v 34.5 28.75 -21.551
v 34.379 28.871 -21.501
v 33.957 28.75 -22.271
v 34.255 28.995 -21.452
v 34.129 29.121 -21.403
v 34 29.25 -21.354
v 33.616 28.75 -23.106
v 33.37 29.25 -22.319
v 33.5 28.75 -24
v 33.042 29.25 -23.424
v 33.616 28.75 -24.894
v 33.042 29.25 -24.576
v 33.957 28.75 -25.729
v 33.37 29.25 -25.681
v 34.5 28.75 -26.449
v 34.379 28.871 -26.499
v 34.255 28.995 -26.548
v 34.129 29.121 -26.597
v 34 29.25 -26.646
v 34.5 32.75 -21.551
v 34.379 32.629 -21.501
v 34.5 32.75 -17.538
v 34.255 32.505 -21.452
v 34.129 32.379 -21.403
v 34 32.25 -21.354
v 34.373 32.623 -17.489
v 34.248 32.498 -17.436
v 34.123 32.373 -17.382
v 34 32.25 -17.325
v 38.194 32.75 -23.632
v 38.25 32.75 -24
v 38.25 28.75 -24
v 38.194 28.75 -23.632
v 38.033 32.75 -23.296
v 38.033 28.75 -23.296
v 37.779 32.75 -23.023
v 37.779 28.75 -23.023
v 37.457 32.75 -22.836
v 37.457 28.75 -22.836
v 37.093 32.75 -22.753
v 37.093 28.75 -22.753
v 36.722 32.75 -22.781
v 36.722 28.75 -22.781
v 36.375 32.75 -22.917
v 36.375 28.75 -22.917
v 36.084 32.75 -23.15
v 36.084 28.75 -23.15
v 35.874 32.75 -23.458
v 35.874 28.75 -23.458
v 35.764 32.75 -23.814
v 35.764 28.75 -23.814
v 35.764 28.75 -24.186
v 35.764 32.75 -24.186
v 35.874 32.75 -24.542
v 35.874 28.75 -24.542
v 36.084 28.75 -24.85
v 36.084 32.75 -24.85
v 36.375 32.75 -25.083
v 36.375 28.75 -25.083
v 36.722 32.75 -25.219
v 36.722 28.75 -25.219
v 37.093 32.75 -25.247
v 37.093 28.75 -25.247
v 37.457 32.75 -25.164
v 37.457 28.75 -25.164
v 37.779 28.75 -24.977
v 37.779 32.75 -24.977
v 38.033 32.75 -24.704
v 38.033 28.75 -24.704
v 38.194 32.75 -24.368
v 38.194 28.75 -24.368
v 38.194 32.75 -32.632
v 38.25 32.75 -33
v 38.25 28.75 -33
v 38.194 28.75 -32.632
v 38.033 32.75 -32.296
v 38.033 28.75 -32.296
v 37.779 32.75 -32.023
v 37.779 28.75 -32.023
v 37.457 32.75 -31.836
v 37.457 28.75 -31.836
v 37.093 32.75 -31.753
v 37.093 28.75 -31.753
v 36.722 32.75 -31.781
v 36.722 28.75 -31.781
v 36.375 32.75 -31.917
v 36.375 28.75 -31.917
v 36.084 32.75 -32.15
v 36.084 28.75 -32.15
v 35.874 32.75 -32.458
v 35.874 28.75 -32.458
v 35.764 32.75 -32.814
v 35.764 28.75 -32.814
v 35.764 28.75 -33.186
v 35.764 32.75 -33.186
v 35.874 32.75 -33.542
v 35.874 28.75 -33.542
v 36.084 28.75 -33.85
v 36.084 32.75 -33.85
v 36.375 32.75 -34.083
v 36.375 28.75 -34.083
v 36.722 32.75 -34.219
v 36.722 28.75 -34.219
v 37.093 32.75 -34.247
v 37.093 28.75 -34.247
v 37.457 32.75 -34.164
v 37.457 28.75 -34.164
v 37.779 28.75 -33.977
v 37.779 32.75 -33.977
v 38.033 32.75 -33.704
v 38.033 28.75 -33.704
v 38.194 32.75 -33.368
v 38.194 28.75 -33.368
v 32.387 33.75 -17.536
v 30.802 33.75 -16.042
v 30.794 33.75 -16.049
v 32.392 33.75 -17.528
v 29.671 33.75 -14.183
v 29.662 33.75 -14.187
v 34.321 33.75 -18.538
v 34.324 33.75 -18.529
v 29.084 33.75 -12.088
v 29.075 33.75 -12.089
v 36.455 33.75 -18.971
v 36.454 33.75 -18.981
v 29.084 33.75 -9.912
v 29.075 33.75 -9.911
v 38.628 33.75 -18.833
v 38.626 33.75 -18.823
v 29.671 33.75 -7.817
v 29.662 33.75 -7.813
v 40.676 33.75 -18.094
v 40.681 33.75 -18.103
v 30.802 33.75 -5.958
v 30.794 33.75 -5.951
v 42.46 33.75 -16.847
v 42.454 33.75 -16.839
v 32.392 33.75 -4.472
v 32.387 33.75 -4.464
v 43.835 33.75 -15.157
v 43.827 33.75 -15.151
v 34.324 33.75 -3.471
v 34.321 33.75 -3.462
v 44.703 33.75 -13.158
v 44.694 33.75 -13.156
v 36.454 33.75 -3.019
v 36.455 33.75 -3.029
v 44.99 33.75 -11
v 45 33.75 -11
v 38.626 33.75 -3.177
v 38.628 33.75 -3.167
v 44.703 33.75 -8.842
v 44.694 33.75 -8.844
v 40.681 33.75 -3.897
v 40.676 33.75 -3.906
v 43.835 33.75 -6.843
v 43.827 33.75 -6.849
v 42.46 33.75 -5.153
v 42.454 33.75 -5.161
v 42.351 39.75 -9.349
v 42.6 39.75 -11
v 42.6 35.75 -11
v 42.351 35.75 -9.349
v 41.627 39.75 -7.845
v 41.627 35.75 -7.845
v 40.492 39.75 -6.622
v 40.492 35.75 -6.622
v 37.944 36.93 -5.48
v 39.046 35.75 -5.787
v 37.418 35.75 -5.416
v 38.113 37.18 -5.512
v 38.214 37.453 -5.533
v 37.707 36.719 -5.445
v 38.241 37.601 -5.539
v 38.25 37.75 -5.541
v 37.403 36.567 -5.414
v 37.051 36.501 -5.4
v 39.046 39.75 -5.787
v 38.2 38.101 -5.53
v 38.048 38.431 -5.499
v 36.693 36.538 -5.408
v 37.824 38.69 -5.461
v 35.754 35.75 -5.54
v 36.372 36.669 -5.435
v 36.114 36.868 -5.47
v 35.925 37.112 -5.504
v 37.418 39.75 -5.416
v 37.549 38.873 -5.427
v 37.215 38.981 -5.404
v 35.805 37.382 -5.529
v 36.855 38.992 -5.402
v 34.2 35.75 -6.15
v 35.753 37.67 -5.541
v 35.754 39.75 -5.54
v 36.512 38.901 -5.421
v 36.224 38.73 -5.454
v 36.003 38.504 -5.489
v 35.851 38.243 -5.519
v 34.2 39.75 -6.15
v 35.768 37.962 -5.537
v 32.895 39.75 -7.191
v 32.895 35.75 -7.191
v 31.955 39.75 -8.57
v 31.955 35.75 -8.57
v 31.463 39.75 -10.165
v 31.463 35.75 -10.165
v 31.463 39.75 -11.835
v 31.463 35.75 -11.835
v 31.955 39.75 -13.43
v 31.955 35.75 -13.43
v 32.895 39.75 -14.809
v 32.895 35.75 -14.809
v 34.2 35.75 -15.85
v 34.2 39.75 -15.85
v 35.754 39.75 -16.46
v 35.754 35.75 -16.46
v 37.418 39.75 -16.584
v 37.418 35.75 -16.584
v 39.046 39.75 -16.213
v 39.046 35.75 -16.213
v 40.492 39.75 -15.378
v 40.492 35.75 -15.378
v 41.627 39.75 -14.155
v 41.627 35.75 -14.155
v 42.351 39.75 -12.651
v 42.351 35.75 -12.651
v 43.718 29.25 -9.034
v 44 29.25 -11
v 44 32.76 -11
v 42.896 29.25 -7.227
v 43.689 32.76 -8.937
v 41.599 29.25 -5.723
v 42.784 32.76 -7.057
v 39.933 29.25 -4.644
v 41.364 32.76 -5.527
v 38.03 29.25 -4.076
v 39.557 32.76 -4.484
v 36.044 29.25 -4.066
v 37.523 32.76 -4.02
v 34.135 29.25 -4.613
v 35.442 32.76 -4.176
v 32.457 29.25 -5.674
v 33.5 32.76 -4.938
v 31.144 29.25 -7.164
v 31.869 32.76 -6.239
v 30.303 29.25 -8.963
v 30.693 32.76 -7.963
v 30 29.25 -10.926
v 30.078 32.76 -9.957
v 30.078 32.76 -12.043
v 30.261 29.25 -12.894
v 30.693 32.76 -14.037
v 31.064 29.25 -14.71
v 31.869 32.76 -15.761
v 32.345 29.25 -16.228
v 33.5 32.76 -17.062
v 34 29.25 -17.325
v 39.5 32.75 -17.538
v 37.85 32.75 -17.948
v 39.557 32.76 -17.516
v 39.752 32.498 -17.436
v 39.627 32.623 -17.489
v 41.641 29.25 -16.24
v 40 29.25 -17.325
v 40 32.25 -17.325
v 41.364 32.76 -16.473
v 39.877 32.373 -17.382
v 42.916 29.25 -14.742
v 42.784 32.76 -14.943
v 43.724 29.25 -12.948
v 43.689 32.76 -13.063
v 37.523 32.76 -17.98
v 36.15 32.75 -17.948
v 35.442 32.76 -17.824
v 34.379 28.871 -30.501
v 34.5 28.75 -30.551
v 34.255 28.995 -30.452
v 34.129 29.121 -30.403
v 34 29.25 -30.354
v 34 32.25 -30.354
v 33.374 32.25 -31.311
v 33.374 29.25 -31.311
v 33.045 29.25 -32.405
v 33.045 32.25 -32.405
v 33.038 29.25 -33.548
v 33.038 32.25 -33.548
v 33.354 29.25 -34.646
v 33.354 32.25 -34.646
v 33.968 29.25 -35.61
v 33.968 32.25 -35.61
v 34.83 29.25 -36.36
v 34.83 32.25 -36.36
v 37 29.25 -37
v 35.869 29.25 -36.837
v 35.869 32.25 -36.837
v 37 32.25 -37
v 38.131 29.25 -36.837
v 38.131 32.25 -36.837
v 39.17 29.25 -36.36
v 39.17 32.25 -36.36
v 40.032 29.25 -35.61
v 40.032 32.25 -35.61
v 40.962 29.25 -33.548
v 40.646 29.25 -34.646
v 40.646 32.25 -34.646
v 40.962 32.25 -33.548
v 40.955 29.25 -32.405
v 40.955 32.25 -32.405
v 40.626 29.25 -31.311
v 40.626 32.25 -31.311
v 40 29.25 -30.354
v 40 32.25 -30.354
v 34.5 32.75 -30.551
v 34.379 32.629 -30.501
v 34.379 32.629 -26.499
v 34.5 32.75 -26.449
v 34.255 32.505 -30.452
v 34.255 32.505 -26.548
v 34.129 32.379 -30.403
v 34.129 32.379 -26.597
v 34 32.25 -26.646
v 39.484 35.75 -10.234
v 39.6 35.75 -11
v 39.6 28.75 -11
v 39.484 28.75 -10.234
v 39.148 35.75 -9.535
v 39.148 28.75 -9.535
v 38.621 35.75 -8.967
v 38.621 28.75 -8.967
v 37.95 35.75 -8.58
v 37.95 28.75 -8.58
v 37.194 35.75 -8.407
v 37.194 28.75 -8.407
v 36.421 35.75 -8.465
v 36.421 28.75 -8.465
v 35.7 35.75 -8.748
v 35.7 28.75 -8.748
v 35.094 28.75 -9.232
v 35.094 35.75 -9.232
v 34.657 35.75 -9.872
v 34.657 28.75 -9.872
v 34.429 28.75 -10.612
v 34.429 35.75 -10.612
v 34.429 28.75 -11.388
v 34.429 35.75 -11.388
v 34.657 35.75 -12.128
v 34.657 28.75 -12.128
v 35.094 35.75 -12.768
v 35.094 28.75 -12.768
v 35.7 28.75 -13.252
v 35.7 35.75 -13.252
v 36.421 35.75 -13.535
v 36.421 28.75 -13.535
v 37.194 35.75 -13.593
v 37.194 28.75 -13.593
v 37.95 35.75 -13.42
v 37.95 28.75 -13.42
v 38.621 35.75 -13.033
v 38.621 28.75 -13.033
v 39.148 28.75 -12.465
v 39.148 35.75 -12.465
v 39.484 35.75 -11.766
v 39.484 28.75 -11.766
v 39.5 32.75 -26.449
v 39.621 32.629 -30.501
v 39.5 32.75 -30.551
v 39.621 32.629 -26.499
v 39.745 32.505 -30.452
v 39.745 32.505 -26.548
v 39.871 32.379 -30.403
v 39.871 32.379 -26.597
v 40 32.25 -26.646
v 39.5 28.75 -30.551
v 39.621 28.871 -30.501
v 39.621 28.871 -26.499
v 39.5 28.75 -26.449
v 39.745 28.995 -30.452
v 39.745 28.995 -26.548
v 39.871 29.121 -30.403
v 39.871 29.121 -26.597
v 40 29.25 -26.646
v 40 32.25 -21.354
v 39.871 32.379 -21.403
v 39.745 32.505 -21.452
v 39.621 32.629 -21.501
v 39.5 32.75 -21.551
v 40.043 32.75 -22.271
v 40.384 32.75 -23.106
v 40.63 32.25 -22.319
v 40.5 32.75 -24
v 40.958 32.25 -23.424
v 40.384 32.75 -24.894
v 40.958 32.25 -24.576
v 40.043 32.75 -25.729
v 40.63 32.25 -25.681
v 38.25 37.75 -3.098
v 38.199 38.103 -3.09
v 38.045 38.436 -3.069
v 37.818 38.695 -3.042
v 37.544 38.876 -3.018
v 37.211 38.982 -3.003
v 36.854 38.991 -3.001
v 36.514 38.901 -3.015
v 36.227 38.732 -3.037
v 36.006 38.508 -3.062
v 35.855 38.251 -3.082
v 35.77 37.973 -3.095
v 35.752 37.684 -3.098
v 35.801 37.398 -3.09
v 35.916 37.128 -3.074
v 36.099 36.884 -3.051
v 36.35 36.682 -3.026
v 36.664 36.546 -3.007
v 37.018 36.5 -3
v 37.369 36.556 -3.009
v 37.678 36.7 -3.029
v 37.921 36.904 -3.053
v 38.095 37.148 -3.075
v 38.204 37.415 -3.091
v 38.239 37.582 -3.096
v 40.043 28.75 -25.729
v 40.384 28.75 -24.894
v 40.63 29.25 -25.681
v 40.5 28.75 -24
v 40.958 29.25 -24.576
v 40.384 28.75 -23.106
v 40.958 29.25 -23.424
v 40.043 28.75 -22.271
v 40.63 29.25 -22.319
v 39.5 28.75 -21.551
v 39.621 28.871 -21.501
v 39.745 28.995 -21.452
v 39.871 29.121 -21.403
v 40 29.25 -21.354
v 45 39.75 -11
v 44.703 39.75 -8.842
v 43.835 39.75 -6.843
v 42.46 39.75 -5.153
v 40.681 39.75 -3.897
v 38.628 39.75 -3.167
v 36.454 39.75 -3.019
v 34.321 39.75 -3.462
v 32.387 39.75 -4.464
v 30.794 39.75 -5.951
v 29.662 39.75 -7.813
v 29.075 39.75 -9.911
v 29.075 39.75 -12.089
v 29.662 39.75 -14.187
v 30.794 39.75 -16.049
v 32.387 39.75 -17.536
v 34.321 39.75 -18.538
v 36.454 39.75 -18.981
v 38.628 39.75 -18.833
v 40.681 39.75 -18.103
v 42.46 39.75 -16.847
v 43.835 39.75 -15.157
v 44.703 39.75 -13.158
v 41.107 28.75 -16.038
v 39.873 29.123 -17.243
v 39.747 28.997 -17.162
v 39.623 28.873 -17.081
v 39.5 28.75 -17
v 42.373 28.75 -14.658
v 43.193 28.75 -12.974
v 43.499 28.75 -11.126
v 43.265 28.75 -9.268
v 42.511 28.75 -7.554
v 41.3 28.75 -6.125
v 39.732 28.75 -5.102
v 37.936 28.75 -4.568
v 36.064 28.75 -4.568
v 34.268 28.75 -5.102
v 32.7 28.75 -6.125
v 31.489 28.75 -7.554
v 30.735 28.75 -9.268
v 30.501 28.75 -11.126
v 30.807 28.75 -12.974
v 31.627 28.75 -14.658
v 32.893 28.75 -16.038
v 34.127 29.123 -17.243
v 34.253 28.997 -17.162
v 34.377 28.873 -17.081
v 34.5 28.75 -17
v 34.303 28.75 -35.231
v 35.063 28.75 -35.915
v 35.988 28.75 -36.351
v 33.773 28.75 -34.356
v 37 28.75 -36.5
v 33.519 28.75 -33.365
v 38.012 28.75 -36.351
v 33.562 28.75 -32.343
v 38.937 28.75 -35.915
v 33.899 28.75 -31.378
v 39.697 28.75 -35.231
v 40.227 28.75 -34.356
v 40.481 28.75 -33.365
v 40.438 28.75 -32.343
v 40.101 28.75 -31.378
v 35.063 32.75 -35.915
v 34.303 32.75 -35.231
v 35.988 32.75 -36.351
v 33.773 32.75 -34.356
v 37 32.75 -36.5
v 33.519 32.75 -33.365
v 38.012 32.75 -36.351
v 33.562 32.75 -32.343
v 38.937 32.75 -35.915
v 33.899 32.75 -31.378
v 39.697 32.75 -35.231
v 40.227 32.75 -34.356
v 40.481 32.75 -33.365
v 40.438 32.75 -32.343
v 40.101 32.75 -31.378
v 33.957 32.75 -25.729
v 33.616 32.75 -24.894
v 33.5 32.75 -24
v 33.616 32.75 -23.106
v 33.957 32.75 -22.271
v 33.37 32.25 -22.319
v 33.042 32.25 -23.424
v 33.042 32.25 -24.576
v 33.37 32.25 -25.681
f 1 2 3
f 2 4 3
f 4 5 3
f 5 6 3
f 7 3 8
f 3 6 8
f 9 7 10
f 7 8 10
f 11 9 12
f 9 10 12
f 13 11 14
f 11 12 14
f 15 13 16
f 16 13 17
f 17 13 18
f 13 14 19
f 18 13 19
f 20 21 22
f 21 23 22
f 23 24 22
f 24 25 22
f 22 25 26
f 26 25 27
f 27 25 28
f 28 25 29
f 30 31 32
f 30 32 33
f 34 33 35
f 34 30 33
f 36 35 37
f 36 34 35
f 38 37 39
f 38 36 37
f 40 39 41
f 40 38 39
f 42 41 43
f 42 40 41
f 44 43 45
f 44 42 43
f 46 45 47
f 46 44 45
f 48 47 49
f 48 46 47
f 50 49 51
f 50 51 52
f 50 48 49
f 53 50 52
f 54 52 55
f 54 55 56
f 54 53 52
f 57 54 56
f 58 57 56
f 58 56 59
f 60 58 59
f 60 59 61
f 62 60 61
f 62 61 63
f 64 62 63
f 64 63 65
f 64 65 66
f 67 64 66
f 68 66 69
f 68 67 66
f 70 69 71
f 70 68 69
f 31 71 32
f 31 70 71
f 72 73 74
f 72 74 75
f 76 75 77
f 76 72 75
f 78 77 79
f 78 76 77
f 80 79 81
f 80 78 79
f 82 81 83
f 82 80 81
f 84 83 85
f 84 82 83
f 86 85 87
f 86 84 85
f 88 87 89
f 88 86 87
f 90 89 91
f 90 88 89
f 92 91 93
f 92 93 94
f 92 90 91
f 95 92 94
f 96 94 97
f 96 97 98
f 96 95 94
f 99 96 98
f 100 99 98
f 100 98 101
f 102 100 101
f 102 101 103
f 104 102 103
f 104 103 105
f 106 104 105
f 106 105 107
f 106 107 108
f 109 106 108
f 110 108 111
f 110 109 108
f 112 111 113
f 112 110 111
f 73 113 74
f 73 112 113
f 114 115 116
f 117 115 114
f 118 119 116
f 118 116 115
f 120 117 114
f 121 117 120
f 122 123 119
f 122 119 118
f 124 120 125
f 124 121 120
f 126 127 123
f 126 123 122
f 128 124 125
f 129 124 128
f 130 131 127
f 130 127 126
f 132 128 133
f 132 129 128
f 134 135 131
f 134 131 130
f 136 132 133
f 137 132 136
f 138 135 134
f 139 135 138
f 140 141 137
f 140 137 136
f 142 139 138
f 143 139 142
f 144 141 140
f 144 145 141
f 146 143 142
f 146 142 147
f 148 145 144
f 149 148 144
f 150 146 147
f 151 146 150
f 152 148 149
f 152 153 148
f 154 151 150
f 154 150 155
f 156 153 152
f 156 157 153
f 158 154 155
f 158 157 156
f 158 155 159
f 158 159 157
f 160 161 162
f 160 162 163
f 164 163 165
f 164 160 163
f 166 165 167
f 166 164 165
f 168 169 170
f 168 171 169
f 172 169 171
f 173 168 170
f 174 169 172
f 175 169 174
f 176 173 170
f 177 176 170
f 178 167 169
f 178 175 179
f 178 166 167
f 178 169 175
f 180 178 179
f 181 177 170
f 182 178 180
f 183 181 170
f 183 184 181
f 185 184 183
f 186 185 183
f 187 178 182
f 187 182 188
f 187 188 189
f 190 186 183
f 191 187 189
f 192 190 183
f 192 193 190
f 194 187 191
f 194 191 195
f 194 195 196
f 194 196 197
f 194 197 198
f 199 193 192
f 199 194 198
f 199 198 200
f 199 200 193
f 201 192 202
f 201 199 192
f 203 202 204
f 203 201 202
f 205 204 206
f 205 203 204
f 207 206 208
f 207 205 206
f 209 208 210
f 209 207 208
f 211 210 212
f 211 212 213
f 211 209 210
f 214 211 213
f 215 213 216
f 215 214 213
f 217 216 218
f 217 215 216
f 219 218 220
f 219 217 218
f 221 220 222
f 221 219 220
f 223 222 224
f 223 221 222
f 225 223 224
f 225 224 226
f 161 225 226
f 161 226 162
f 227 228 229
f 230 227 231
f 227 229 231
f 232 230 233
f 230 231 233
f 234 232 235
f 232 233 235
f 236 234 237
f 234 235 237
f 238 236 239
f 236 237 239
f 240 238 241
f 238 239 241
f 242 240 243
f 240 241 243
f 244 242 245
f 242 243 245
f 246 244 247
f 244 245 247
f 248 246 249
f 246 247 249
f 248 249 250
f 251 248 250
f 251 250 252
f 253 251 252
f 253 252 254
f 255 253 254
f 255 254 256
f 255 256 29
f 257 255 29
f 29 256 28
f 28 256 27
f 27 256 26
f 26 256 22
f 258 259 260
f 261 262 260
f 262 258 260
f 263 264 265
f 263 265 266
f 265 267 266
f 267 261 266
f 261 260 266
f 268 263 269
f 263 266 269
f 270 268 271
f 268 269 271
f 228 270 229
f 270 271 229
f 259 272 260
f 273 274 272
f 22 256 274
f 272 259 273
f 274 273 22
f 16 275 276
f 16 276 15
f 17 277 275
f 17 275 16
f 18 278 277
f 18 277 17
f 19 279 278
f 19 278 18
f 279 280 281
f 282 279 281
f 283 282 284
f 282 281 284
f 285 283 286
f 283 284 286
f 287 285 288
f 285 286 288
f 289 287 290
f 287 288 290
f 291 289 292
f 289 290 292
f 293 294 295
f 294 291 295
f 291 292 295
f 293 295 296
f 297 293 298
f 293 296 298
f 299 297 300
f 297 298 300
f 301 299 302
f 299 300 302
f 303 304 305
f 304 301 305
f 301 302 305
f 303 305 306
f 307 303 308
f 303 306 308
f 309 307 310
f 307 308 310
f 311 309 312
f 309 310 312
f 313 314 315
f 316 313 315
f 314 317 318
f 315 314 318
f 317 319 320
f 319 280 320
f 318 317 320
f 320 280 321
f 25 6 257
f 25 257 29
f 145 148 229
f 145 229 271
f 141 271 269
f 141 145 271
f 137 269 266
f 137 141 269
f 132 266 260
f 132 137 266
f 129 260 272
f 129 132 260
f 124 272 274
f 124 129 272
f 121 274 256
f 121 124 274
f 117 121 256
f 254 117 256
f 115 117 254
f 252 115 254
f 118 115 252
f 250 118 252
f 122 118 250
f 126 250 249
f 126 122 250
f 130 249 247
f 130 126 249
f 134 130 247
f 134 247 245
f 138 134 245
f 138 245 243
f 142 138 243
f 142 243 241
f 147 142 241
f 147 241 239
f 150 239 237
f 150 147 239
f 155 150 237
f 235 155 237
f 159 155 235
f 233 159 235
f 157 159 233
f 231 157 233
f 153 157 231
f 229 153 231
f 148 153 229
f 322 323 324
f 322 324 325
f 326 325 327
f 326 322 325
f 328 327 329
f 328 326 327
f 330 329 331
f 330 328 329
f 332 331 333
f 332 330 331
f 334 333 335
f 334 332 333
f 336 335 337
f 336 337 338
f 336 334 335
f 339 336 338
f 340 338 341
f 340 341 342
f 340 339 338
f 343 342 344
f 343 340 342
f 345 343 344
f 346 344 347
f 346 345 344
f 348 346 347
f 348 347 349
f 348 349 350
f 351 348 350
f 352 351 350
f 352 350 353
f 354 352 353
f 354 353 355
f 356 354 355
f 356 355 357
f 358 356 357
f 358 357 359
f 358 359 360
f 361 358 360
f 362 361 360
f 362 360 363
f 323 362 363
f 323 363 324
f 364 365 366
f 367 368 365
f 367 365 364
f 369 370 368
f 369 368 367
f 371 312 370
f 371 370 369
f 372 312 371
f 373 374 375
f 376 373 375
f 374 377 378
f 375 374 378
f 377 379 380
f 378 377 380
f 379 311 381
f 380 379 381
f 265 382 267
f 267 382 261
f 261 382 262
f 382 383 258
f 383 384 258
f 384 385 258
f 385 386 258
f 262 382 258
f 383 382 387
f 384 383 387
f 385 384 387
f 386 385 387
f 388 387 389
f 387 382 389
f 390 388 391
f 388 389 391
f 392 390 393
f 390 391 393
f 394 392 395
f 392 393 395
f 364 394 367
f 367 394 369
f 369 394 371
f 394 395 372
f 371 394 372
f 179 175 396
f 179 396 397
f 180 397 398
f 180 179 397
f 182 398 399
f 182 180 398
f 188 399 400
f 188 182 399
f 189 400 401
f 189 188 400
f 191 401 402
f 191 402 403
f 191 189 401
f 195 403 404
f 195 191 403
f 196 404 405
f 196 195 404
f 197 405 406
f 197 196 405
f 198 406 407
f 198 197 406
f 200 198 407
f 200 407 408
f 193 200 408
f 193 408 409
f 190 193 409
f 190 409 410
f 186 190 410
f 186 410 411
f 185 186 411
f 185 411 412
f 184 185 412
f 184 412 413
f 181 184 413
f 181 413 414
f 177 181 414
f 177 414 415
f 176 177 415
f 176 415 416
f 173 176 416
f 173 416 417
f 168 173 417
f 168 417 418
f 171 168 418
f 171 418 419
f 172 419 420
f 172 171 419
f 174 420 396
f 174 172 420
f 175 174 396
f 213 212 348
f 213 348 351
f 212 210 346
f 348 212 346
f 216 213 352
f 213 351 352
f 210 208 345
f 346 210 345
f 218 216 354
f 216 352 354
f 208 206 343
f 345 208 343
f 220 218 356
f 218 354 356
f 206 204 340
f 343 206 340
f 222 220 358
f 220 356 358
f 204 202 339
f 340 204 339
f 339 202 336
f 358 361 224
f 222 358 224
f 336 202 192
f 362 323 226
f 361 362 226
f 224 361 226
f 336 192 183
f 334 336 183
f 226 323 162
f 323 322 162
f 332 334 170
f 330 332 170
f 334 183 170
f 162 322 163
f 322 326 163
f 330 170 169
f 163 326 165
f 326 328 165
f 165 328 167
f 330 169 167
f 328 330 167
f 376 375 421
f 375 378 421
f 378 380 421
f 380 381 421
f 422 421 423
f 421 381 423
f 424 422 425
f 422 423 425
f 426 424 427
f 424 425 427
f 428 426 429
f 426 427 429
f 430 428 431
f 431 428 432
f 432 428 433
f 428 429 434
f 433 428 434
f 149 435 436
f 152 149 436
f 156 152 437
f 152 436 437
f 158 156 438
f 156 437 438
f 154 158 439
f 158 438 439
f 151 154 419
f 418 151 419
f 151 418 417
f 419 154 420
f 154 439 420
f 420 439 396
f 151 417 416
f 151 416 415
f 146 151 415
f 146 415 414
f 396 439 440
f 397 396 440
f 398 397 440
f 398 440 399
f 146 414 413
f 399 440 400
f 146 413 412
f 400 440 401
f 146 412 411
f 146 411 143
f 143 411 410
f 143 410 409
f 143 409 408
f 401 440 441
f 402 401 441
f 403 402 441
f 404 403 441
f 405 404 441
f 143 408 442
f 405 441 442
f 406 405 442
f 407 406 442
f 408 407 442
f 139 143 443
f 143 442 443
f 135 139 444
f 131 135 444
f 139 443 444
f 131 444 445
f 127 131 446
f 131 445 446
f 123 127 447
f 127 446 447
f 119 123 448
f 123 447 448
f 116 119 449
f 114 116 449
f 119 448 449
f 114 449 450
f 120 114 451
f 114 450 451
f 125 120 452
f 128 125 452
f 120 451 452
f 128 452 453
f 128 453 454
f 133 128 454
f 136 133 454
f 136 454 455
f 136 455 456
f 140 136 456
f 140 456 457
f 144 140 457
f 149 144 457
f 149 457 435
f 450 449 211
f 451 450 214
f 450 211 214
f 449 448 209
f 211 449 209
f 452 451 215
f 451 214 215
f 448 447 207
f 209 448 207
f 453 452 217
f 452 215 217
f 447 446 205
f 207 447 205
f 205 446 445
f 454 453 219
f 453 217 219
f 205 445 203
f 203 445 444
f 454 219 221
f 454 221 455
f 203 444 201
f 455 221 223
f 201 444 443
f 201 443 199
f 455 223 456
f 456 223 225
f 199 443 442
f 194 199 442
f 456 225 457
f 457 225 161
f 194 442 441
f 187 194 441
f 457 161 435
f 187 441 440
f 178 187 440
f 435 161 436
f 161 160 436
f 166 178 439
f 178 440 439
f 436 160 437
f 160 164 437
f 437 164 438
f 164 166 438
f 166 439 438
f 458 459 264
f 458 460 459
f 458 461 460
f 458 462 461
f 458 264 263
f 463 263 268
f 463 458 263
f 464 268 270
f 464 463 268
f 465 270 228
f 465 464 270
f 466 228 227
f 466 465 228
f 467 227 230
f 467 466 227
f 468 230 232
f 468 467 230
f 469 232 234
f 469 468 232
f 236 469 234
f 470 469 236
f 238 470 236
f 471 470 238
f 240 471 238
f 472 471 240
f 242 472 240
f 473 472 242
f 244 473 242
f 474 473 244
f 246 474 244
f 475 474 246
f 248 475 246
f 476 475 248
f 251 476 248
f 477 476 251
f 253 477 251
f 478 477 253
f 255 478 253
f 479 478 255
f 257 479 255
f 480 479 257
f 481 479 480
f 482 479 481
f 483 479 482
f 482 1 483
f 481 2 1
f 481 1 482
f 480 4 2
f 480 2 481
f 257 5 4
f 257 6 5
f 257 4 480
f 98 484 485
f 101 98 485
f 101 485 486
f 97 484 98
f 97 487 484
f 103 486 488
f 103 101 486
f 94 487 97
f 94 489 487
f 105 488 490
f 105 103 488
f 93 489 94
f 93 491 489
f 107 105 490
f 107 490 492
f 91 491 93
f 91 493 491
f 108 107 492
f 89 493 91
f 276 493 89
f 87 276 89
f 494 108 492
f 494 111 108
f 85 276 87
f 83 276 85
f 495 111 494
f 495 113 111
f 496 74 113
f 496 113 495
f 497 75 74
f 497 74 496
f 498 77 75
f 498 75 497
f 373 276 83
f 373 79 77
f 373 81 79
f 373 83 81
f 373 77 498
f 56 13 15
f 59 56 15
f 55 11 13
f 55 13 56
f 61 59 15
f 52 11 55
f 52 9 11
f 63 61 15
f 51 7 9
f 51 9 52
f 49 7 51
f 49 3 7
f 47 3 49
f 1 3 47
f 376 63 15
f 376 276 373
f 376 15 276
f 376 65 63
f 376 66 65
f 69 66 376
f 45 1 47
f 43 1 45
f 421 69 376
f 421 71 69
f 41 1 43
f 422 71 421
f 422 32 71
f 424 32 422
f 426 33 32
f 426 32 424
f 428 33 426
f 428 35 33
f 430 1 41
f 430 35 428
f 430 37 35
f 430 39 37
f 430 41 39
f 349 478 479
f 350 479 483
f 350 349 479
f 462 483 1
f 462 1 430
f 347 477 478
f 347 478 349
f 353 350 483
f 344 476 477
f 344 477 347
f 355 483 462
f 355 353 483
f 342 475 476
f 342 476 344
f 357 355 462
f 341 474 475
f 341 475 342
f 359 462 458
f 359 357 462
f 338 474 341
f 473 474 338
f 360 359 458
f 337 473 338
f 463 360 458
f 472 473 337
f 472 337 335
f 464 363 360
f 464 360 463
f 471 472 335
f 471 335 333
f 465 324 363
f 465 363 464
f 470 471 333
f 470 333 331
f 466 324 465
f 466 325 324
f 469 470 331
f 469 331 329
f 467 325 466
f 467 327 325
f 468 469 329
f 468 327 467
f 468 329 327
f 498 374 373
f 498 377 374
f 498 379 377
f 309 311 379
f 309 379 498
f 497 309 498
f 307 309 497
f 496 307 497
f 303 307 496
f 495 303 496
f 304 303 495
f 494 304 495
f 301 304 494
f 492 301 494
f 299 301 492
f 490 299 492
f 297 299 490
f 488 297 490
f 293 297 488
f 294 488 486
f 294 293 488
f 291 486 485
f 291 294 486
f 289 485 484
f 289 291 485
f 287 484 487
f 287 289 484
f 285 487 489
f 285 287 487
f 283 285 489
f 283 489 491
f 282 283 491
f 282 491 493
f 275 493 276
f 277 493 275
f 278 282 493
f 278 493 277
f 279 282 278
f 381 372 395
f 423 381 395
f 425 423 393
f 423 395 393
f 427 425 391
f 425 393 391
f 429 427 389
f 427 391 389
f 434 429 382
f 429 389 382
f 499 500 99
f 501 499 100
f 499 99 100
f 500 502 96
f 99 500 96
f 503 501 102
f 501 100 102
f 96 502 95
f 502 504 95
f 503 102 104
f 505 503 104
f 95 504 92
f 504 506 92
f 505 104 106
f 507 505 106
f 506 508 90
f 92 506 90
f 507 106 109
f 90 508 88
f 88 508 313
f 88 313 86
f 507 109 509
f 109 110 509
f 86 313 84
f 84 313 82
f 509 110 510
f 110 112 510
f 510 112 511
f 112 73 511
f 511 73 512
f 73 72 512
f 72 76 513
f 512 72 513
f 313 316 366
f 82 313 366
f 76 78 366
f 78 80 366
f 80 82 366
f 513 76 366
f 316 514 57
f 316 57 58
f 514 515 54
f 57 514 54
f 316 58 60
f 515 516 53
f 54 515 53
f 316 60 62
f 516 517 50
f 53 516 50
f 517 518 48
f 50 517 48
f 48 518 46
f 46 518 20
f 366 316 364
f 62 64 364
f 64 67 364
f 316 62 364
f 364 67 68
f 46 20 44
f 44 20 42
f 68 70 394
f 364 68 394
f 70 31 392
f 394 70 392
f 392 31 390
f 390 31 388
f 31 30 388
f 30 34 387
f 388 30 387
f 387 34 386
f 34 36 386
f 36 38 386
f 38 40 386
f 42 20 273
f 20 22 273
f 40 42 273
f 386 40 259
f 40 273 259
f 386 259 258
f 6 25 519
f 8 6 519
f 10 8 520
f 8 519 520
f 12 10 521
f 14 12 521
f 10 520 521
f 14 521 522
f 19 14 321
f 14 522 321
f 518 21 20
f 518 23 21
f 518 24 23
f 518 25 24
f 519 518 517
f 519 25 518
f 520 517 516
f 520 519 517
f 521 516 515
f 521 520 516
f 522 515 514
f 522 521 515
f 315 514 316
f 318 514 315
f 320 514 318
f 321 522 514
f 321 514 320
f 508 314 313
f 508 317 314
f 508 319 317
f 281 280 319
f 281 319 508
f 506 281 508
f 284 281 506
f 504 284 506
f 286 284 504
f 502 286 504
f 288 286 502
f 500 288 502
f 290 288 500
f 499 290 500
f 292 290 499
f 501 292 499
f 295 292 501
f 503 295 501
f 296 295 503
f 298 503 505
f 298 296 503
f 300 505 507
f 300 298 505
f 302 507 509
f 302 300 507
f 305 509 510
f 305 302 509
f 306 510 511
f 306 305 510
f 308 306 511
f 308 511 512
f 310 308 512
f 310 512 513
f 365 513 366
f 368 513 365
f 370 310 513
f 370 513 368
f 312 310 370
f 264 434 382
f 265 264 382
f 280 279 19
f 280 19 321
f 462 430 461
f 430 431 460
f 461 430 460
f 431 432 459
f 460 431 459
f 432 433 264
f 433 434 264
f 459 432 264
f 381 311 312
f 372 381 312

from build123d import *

# Parameters (mm, degrees)
CYLINDER887_R          = 1.25
CYLINDER887_DEPTH      = 7
CYLINDER885_R          = 2.6
CYLINDER885_DEPTH      = 11
CYLINDER885_ROLL_ANGLE = 90
CYLINDER883_R          = 1.25
CYLINDER883_DEPTH      = 4
CYLINDER883_ROLL_ANGLE = 90
CYLINDER884_R          = 5.6
CYLINDER884_DEPTH      = 4
CYLINDER884_ROLL_ANGLE = 90
CYLINDER882_R          = 1.25
CYLINDER882_DEPTH      = 4
CYLINDER882_ROLL_ANGLE = 90
BOX549_W               = 6
BOX549_H               = 4
BOX549_DEPTH           = 22
CYLINDER880_R          = 4
CYLINDER880_DEPTH      = 4
CYLINDER880_ROLL_ANGLE = 90
CYLINDER878_R          = 7
CYLINDER878_DEPTH      = 6
CYLINDER878_ROLL_ANGLE = 90
CYLINDER881_R          = 4
CYLINDER881_DEPTH      = 4
CYLINDER881_ROLL_ANGLE = 90
CYLINDER886_R          = 8
CYLINDER886_DEPTH      = 6
CYLINDER886_ROLL_ANGLE = 90
CHAMFER103_SIZE        = 0.99
CHAMFER104_SIZE        = 0.5


with BuildPart() as cylinder1047:
    # Cylinder887 → Cylinder887 (new body)
    with BuildSketch(Plane(origin=(37, 37.75, -8), x_dir=(1, 0, 0), z_dir=(0, 0, 1))):
        Circle(CYLINDER887_R)
    extrude(amount=CYLINDER887_DEPTH)


with BuildPart() as cylinder1045:
    # Cylinder885 → Cylinder885 (new body)
    with BuildSketch(Plane.XY):
        Circle(CYLINDER885_R)
    extrude(amount=CYLINDER885_DEPTH)


with BuildPart() as cylinder1045_1:
    # Cylinder885 roll: moved
    add(cylinder1045.part.rotate(Axis((0, 0, 0), (1, 0, 0)), CYLINDER885_ROLL_ANGLE))


with BuildPart() as cylinder1045_2:
    # Cylinder885 placement: moved
    add(cylinder1045_1.part.moved(Location((37, 39.75, -11))))


with BuildPart() as cylinder1043:
    # Cylinder883 → Cylinder883 (new body)
    with BuildSketch(Plane.XY):
        Circle(CYLINDER883_R)
    extrude(amount=CYLINDER883_DEPTH)


with BuildPart() as cylinder1043_1:
    # Cylinder883 roll: moved
    add(cylinder1043.part.rotate(Axis((0, 0, 0), (1, 0, 0)), CYLINDER883_ROLL_ANGLE))


with BuildPart() as cylinder1043_2:
    # Cylinder883 placement: moved
    add(cylinder1043_1.part.moved(Location((37, 32.75, -33))))


with BuildPart() as cylinder1044:
    # Cylinder884 → Cylinder884 (new body)
    with BuildSketch(Plane.XY):
        Circle(CYLINDER884_R)
    extrude(amount=CYLINDER884_DEPTH)


with BuildPart() as cylinder1044_1:
    # Cylinder884 roll: moved
    add(cylinder1044.part.rotate(Axis((0, 0, 0), (1, 0, 0)), CYLINDER884_ROLL_ANGLE))


with BuildPart() as cylinder1044_2:
    # Cylinder884 placement: moved
    add(cylinder1044_1.part.moved(Location((37, 39.75, -11))))


with BuildPart() as fusion566:
    # Cylinder882 → Cylinder882 (new body)
    with BuildSketch(Plane.XY):
        Circle(CYLINDER882_R)
    extrude(amount=CYLINDER882_DEPTH)


with BuildPart() as fusion566_1:
    # Cylinder882 roll: moved
    add(fusion566.part.rotate(Axis((0, 0, 0), (1, 0, 0)), CYLINDER882_ROLL_ANGLE))


with BuildPart() as fusion566_2:
    # Cylinder882 placement: moved
    add(fusion566_1.part.moved(Location((37, 32.75, -24))))

    # Fusion566: union Cylinder1045, Cylinder1043, Cylinder1044
    add(cylinder1045_2.part)
    add(cylinder1043_2.part)
    add(cylinder1044_2.part)


with BuildPart() as cube740:
    # Box549 → Box549 (new body)
    with BuildSketch(Plane(origin=(34, 33.75, -33), x_dir=(1, 0, 0), z_dir=(0, 0, 1))):
        with Locations((3, 2)):
            Rectangle(BOX549_W, BOX549_H)
    extrude(amount=BOX549_DEPTH)


with BuildPart() as cylinder1040:
    # Cylinder880 → Cylinder880 (new body)
    with BuildSketch(Plane.XY):
        Circle(CYLINDER880_R)
    extrude(amount=CYLINDER880_DEPTH)


with BuildPart() as cylinder1040_1:
    # Cylinder880 roll: moved
    add(cylinder1040.part.rotate(Axis((0, 0, 0), (1, 0, 0)), CYLINDER880_ROLL_ANGLE))


with BuildPart() as cylinder1040_2:
    # Cylinder880 placement: moved
    add(cylinder1040_1.part.moved(Location((37, 37.75, -33))))


with BuildPart() as cylinder1039:
    # Cylinder878 → Cylinder878 (new body)
    with BuildSketch(Plane.XY):
        Circle(CYLINDER878_R)
    extrude(amount=CYLINDER878_DEPTH)


with BuildPart() as cylinder1039_1:
    # Cylinder878 roll: moved
    add(cylinder1039.part.rotate(Axis((0, 0, 0), (1, 0, 0)), CYLINDER878_ROLL_ANGLE))


with BuildPart() as cylinder1039_2:
    # Cylinder878 placement: moved
    add(cylinder1039_1.part.moved(Location((37, 39.75, -11))))


with BuildPart() as fusion564:
    # Cylinder881 → Cylinder881 (new body)
    with BuildSketch(Plane.XY):
        Circle(CYLINDER881_R)
    extrude(amount=CYLINDER881_DEPTH)


with BuildPart() as fusion564_1:
    # Cylinder881 roll: moved
    add(fusion564.part.rotate(Axis((0, 0, 0), (1, 0, 0)), CYLINDER881_ROLL_ANGLE))


with BuildPart() as fusion564_2:
    # Cylinder881 placement: moved
    add(fusion564_1.part.moved(Location((37, 37.75, -24))))

    # Fusion564: union Cube740, Cylinder1040, Cylinder1039
    add(cube740.part)
    add(cylinder1040_2.part)
    add(cylinder1039_2.part)


with BuildPart() as fusion564_3:
    # Fusion564 placement: moved
    add(fusion564_2.part.moved(Location((0, -5, 0))))


with BuildPart() as front_axle_steering_arm_int_servo:
    # Cylinder886 → Cylinder886 (new body)
    with BuildSketch(Plane.XY):
        Circle(CYLINDER886_R)
    extrude(amount=CYLINDER886_DEPTH)


with BuildPart() as front_axle_steering_arm_int_servo_1:
    # Cylinder886 roll: moved
    add(front_axle_steering_arm_int_servo.part.rotate(Axis((0, 0, 0), (1, 0, 0)), CYLINDER886_ROLL_ANGLE))


with BuildPart() as front_axle_steering_arm_int_servo_2:
    # Cylinder886 placement: moved
    add(front_axle_steering_arm_int_servo_1.part.moved(Location((37, 39.75, -11))))

    # Fusion565: union Fusion564
    add(fusion564_3.part)

    # Cut671: cut Fusion566
    add(fusion566_2.part, mode=Mode.SUBTRACT)

    # Chamfer103
    chamfer103_edges = [front_axle_steering_arm_int_servo_2.edges().sort_by_distance(p)[0] for p in [
        (30, 33.75, -11),
    ]]
    chamfer(chamfer103_edges, length=CHAMFER103_SIZE)

    # Cut672: cut Cylinder1047
    add(cylinder1047.part, mode=Mode.SUBTRACT)

    # Chamfer104
    chamfer104_edges = [front_axle_steering_arm_int_servo_2.edges().sort_by_distance(p)[0] for p in [
        (33.258343, 28.75, -5.08392),
        (42.91608, 28.75, -14.741657),
        (40, 28.75, -19.339402),
        (40.741657, 28.75, -22.585786),
        (34, 28.75, -19.339402),
        (40.741657, 28.75, -25.414214),
        (33, 28.75, -24),
        (40, 28.75, -28.5),
        (34, 28.75, -28.5),
        (40.741657, 28.75, -31.585786),
        (35.585786, 28.75, -36.741657),
        (34, 32.75, -19.339402),
        (40, 32.75, -19.339402),
        (40.741657, 32.75, -22.585786),
        (40.741657, 32.75, -25.414214),
        (40, 32.75, -28.5),
        (33, 32.75, -24),
        (40.741657, 32.75, -31.585786),
        (34, 32.75, -28.5),
        (35.585786, 32.75, -36.741657),
    ]]
    chamfer(chamfer104_edges, length=CHAMFER104_SIZE)


solid = front_axle_steering_arm_int_servo_2.part
